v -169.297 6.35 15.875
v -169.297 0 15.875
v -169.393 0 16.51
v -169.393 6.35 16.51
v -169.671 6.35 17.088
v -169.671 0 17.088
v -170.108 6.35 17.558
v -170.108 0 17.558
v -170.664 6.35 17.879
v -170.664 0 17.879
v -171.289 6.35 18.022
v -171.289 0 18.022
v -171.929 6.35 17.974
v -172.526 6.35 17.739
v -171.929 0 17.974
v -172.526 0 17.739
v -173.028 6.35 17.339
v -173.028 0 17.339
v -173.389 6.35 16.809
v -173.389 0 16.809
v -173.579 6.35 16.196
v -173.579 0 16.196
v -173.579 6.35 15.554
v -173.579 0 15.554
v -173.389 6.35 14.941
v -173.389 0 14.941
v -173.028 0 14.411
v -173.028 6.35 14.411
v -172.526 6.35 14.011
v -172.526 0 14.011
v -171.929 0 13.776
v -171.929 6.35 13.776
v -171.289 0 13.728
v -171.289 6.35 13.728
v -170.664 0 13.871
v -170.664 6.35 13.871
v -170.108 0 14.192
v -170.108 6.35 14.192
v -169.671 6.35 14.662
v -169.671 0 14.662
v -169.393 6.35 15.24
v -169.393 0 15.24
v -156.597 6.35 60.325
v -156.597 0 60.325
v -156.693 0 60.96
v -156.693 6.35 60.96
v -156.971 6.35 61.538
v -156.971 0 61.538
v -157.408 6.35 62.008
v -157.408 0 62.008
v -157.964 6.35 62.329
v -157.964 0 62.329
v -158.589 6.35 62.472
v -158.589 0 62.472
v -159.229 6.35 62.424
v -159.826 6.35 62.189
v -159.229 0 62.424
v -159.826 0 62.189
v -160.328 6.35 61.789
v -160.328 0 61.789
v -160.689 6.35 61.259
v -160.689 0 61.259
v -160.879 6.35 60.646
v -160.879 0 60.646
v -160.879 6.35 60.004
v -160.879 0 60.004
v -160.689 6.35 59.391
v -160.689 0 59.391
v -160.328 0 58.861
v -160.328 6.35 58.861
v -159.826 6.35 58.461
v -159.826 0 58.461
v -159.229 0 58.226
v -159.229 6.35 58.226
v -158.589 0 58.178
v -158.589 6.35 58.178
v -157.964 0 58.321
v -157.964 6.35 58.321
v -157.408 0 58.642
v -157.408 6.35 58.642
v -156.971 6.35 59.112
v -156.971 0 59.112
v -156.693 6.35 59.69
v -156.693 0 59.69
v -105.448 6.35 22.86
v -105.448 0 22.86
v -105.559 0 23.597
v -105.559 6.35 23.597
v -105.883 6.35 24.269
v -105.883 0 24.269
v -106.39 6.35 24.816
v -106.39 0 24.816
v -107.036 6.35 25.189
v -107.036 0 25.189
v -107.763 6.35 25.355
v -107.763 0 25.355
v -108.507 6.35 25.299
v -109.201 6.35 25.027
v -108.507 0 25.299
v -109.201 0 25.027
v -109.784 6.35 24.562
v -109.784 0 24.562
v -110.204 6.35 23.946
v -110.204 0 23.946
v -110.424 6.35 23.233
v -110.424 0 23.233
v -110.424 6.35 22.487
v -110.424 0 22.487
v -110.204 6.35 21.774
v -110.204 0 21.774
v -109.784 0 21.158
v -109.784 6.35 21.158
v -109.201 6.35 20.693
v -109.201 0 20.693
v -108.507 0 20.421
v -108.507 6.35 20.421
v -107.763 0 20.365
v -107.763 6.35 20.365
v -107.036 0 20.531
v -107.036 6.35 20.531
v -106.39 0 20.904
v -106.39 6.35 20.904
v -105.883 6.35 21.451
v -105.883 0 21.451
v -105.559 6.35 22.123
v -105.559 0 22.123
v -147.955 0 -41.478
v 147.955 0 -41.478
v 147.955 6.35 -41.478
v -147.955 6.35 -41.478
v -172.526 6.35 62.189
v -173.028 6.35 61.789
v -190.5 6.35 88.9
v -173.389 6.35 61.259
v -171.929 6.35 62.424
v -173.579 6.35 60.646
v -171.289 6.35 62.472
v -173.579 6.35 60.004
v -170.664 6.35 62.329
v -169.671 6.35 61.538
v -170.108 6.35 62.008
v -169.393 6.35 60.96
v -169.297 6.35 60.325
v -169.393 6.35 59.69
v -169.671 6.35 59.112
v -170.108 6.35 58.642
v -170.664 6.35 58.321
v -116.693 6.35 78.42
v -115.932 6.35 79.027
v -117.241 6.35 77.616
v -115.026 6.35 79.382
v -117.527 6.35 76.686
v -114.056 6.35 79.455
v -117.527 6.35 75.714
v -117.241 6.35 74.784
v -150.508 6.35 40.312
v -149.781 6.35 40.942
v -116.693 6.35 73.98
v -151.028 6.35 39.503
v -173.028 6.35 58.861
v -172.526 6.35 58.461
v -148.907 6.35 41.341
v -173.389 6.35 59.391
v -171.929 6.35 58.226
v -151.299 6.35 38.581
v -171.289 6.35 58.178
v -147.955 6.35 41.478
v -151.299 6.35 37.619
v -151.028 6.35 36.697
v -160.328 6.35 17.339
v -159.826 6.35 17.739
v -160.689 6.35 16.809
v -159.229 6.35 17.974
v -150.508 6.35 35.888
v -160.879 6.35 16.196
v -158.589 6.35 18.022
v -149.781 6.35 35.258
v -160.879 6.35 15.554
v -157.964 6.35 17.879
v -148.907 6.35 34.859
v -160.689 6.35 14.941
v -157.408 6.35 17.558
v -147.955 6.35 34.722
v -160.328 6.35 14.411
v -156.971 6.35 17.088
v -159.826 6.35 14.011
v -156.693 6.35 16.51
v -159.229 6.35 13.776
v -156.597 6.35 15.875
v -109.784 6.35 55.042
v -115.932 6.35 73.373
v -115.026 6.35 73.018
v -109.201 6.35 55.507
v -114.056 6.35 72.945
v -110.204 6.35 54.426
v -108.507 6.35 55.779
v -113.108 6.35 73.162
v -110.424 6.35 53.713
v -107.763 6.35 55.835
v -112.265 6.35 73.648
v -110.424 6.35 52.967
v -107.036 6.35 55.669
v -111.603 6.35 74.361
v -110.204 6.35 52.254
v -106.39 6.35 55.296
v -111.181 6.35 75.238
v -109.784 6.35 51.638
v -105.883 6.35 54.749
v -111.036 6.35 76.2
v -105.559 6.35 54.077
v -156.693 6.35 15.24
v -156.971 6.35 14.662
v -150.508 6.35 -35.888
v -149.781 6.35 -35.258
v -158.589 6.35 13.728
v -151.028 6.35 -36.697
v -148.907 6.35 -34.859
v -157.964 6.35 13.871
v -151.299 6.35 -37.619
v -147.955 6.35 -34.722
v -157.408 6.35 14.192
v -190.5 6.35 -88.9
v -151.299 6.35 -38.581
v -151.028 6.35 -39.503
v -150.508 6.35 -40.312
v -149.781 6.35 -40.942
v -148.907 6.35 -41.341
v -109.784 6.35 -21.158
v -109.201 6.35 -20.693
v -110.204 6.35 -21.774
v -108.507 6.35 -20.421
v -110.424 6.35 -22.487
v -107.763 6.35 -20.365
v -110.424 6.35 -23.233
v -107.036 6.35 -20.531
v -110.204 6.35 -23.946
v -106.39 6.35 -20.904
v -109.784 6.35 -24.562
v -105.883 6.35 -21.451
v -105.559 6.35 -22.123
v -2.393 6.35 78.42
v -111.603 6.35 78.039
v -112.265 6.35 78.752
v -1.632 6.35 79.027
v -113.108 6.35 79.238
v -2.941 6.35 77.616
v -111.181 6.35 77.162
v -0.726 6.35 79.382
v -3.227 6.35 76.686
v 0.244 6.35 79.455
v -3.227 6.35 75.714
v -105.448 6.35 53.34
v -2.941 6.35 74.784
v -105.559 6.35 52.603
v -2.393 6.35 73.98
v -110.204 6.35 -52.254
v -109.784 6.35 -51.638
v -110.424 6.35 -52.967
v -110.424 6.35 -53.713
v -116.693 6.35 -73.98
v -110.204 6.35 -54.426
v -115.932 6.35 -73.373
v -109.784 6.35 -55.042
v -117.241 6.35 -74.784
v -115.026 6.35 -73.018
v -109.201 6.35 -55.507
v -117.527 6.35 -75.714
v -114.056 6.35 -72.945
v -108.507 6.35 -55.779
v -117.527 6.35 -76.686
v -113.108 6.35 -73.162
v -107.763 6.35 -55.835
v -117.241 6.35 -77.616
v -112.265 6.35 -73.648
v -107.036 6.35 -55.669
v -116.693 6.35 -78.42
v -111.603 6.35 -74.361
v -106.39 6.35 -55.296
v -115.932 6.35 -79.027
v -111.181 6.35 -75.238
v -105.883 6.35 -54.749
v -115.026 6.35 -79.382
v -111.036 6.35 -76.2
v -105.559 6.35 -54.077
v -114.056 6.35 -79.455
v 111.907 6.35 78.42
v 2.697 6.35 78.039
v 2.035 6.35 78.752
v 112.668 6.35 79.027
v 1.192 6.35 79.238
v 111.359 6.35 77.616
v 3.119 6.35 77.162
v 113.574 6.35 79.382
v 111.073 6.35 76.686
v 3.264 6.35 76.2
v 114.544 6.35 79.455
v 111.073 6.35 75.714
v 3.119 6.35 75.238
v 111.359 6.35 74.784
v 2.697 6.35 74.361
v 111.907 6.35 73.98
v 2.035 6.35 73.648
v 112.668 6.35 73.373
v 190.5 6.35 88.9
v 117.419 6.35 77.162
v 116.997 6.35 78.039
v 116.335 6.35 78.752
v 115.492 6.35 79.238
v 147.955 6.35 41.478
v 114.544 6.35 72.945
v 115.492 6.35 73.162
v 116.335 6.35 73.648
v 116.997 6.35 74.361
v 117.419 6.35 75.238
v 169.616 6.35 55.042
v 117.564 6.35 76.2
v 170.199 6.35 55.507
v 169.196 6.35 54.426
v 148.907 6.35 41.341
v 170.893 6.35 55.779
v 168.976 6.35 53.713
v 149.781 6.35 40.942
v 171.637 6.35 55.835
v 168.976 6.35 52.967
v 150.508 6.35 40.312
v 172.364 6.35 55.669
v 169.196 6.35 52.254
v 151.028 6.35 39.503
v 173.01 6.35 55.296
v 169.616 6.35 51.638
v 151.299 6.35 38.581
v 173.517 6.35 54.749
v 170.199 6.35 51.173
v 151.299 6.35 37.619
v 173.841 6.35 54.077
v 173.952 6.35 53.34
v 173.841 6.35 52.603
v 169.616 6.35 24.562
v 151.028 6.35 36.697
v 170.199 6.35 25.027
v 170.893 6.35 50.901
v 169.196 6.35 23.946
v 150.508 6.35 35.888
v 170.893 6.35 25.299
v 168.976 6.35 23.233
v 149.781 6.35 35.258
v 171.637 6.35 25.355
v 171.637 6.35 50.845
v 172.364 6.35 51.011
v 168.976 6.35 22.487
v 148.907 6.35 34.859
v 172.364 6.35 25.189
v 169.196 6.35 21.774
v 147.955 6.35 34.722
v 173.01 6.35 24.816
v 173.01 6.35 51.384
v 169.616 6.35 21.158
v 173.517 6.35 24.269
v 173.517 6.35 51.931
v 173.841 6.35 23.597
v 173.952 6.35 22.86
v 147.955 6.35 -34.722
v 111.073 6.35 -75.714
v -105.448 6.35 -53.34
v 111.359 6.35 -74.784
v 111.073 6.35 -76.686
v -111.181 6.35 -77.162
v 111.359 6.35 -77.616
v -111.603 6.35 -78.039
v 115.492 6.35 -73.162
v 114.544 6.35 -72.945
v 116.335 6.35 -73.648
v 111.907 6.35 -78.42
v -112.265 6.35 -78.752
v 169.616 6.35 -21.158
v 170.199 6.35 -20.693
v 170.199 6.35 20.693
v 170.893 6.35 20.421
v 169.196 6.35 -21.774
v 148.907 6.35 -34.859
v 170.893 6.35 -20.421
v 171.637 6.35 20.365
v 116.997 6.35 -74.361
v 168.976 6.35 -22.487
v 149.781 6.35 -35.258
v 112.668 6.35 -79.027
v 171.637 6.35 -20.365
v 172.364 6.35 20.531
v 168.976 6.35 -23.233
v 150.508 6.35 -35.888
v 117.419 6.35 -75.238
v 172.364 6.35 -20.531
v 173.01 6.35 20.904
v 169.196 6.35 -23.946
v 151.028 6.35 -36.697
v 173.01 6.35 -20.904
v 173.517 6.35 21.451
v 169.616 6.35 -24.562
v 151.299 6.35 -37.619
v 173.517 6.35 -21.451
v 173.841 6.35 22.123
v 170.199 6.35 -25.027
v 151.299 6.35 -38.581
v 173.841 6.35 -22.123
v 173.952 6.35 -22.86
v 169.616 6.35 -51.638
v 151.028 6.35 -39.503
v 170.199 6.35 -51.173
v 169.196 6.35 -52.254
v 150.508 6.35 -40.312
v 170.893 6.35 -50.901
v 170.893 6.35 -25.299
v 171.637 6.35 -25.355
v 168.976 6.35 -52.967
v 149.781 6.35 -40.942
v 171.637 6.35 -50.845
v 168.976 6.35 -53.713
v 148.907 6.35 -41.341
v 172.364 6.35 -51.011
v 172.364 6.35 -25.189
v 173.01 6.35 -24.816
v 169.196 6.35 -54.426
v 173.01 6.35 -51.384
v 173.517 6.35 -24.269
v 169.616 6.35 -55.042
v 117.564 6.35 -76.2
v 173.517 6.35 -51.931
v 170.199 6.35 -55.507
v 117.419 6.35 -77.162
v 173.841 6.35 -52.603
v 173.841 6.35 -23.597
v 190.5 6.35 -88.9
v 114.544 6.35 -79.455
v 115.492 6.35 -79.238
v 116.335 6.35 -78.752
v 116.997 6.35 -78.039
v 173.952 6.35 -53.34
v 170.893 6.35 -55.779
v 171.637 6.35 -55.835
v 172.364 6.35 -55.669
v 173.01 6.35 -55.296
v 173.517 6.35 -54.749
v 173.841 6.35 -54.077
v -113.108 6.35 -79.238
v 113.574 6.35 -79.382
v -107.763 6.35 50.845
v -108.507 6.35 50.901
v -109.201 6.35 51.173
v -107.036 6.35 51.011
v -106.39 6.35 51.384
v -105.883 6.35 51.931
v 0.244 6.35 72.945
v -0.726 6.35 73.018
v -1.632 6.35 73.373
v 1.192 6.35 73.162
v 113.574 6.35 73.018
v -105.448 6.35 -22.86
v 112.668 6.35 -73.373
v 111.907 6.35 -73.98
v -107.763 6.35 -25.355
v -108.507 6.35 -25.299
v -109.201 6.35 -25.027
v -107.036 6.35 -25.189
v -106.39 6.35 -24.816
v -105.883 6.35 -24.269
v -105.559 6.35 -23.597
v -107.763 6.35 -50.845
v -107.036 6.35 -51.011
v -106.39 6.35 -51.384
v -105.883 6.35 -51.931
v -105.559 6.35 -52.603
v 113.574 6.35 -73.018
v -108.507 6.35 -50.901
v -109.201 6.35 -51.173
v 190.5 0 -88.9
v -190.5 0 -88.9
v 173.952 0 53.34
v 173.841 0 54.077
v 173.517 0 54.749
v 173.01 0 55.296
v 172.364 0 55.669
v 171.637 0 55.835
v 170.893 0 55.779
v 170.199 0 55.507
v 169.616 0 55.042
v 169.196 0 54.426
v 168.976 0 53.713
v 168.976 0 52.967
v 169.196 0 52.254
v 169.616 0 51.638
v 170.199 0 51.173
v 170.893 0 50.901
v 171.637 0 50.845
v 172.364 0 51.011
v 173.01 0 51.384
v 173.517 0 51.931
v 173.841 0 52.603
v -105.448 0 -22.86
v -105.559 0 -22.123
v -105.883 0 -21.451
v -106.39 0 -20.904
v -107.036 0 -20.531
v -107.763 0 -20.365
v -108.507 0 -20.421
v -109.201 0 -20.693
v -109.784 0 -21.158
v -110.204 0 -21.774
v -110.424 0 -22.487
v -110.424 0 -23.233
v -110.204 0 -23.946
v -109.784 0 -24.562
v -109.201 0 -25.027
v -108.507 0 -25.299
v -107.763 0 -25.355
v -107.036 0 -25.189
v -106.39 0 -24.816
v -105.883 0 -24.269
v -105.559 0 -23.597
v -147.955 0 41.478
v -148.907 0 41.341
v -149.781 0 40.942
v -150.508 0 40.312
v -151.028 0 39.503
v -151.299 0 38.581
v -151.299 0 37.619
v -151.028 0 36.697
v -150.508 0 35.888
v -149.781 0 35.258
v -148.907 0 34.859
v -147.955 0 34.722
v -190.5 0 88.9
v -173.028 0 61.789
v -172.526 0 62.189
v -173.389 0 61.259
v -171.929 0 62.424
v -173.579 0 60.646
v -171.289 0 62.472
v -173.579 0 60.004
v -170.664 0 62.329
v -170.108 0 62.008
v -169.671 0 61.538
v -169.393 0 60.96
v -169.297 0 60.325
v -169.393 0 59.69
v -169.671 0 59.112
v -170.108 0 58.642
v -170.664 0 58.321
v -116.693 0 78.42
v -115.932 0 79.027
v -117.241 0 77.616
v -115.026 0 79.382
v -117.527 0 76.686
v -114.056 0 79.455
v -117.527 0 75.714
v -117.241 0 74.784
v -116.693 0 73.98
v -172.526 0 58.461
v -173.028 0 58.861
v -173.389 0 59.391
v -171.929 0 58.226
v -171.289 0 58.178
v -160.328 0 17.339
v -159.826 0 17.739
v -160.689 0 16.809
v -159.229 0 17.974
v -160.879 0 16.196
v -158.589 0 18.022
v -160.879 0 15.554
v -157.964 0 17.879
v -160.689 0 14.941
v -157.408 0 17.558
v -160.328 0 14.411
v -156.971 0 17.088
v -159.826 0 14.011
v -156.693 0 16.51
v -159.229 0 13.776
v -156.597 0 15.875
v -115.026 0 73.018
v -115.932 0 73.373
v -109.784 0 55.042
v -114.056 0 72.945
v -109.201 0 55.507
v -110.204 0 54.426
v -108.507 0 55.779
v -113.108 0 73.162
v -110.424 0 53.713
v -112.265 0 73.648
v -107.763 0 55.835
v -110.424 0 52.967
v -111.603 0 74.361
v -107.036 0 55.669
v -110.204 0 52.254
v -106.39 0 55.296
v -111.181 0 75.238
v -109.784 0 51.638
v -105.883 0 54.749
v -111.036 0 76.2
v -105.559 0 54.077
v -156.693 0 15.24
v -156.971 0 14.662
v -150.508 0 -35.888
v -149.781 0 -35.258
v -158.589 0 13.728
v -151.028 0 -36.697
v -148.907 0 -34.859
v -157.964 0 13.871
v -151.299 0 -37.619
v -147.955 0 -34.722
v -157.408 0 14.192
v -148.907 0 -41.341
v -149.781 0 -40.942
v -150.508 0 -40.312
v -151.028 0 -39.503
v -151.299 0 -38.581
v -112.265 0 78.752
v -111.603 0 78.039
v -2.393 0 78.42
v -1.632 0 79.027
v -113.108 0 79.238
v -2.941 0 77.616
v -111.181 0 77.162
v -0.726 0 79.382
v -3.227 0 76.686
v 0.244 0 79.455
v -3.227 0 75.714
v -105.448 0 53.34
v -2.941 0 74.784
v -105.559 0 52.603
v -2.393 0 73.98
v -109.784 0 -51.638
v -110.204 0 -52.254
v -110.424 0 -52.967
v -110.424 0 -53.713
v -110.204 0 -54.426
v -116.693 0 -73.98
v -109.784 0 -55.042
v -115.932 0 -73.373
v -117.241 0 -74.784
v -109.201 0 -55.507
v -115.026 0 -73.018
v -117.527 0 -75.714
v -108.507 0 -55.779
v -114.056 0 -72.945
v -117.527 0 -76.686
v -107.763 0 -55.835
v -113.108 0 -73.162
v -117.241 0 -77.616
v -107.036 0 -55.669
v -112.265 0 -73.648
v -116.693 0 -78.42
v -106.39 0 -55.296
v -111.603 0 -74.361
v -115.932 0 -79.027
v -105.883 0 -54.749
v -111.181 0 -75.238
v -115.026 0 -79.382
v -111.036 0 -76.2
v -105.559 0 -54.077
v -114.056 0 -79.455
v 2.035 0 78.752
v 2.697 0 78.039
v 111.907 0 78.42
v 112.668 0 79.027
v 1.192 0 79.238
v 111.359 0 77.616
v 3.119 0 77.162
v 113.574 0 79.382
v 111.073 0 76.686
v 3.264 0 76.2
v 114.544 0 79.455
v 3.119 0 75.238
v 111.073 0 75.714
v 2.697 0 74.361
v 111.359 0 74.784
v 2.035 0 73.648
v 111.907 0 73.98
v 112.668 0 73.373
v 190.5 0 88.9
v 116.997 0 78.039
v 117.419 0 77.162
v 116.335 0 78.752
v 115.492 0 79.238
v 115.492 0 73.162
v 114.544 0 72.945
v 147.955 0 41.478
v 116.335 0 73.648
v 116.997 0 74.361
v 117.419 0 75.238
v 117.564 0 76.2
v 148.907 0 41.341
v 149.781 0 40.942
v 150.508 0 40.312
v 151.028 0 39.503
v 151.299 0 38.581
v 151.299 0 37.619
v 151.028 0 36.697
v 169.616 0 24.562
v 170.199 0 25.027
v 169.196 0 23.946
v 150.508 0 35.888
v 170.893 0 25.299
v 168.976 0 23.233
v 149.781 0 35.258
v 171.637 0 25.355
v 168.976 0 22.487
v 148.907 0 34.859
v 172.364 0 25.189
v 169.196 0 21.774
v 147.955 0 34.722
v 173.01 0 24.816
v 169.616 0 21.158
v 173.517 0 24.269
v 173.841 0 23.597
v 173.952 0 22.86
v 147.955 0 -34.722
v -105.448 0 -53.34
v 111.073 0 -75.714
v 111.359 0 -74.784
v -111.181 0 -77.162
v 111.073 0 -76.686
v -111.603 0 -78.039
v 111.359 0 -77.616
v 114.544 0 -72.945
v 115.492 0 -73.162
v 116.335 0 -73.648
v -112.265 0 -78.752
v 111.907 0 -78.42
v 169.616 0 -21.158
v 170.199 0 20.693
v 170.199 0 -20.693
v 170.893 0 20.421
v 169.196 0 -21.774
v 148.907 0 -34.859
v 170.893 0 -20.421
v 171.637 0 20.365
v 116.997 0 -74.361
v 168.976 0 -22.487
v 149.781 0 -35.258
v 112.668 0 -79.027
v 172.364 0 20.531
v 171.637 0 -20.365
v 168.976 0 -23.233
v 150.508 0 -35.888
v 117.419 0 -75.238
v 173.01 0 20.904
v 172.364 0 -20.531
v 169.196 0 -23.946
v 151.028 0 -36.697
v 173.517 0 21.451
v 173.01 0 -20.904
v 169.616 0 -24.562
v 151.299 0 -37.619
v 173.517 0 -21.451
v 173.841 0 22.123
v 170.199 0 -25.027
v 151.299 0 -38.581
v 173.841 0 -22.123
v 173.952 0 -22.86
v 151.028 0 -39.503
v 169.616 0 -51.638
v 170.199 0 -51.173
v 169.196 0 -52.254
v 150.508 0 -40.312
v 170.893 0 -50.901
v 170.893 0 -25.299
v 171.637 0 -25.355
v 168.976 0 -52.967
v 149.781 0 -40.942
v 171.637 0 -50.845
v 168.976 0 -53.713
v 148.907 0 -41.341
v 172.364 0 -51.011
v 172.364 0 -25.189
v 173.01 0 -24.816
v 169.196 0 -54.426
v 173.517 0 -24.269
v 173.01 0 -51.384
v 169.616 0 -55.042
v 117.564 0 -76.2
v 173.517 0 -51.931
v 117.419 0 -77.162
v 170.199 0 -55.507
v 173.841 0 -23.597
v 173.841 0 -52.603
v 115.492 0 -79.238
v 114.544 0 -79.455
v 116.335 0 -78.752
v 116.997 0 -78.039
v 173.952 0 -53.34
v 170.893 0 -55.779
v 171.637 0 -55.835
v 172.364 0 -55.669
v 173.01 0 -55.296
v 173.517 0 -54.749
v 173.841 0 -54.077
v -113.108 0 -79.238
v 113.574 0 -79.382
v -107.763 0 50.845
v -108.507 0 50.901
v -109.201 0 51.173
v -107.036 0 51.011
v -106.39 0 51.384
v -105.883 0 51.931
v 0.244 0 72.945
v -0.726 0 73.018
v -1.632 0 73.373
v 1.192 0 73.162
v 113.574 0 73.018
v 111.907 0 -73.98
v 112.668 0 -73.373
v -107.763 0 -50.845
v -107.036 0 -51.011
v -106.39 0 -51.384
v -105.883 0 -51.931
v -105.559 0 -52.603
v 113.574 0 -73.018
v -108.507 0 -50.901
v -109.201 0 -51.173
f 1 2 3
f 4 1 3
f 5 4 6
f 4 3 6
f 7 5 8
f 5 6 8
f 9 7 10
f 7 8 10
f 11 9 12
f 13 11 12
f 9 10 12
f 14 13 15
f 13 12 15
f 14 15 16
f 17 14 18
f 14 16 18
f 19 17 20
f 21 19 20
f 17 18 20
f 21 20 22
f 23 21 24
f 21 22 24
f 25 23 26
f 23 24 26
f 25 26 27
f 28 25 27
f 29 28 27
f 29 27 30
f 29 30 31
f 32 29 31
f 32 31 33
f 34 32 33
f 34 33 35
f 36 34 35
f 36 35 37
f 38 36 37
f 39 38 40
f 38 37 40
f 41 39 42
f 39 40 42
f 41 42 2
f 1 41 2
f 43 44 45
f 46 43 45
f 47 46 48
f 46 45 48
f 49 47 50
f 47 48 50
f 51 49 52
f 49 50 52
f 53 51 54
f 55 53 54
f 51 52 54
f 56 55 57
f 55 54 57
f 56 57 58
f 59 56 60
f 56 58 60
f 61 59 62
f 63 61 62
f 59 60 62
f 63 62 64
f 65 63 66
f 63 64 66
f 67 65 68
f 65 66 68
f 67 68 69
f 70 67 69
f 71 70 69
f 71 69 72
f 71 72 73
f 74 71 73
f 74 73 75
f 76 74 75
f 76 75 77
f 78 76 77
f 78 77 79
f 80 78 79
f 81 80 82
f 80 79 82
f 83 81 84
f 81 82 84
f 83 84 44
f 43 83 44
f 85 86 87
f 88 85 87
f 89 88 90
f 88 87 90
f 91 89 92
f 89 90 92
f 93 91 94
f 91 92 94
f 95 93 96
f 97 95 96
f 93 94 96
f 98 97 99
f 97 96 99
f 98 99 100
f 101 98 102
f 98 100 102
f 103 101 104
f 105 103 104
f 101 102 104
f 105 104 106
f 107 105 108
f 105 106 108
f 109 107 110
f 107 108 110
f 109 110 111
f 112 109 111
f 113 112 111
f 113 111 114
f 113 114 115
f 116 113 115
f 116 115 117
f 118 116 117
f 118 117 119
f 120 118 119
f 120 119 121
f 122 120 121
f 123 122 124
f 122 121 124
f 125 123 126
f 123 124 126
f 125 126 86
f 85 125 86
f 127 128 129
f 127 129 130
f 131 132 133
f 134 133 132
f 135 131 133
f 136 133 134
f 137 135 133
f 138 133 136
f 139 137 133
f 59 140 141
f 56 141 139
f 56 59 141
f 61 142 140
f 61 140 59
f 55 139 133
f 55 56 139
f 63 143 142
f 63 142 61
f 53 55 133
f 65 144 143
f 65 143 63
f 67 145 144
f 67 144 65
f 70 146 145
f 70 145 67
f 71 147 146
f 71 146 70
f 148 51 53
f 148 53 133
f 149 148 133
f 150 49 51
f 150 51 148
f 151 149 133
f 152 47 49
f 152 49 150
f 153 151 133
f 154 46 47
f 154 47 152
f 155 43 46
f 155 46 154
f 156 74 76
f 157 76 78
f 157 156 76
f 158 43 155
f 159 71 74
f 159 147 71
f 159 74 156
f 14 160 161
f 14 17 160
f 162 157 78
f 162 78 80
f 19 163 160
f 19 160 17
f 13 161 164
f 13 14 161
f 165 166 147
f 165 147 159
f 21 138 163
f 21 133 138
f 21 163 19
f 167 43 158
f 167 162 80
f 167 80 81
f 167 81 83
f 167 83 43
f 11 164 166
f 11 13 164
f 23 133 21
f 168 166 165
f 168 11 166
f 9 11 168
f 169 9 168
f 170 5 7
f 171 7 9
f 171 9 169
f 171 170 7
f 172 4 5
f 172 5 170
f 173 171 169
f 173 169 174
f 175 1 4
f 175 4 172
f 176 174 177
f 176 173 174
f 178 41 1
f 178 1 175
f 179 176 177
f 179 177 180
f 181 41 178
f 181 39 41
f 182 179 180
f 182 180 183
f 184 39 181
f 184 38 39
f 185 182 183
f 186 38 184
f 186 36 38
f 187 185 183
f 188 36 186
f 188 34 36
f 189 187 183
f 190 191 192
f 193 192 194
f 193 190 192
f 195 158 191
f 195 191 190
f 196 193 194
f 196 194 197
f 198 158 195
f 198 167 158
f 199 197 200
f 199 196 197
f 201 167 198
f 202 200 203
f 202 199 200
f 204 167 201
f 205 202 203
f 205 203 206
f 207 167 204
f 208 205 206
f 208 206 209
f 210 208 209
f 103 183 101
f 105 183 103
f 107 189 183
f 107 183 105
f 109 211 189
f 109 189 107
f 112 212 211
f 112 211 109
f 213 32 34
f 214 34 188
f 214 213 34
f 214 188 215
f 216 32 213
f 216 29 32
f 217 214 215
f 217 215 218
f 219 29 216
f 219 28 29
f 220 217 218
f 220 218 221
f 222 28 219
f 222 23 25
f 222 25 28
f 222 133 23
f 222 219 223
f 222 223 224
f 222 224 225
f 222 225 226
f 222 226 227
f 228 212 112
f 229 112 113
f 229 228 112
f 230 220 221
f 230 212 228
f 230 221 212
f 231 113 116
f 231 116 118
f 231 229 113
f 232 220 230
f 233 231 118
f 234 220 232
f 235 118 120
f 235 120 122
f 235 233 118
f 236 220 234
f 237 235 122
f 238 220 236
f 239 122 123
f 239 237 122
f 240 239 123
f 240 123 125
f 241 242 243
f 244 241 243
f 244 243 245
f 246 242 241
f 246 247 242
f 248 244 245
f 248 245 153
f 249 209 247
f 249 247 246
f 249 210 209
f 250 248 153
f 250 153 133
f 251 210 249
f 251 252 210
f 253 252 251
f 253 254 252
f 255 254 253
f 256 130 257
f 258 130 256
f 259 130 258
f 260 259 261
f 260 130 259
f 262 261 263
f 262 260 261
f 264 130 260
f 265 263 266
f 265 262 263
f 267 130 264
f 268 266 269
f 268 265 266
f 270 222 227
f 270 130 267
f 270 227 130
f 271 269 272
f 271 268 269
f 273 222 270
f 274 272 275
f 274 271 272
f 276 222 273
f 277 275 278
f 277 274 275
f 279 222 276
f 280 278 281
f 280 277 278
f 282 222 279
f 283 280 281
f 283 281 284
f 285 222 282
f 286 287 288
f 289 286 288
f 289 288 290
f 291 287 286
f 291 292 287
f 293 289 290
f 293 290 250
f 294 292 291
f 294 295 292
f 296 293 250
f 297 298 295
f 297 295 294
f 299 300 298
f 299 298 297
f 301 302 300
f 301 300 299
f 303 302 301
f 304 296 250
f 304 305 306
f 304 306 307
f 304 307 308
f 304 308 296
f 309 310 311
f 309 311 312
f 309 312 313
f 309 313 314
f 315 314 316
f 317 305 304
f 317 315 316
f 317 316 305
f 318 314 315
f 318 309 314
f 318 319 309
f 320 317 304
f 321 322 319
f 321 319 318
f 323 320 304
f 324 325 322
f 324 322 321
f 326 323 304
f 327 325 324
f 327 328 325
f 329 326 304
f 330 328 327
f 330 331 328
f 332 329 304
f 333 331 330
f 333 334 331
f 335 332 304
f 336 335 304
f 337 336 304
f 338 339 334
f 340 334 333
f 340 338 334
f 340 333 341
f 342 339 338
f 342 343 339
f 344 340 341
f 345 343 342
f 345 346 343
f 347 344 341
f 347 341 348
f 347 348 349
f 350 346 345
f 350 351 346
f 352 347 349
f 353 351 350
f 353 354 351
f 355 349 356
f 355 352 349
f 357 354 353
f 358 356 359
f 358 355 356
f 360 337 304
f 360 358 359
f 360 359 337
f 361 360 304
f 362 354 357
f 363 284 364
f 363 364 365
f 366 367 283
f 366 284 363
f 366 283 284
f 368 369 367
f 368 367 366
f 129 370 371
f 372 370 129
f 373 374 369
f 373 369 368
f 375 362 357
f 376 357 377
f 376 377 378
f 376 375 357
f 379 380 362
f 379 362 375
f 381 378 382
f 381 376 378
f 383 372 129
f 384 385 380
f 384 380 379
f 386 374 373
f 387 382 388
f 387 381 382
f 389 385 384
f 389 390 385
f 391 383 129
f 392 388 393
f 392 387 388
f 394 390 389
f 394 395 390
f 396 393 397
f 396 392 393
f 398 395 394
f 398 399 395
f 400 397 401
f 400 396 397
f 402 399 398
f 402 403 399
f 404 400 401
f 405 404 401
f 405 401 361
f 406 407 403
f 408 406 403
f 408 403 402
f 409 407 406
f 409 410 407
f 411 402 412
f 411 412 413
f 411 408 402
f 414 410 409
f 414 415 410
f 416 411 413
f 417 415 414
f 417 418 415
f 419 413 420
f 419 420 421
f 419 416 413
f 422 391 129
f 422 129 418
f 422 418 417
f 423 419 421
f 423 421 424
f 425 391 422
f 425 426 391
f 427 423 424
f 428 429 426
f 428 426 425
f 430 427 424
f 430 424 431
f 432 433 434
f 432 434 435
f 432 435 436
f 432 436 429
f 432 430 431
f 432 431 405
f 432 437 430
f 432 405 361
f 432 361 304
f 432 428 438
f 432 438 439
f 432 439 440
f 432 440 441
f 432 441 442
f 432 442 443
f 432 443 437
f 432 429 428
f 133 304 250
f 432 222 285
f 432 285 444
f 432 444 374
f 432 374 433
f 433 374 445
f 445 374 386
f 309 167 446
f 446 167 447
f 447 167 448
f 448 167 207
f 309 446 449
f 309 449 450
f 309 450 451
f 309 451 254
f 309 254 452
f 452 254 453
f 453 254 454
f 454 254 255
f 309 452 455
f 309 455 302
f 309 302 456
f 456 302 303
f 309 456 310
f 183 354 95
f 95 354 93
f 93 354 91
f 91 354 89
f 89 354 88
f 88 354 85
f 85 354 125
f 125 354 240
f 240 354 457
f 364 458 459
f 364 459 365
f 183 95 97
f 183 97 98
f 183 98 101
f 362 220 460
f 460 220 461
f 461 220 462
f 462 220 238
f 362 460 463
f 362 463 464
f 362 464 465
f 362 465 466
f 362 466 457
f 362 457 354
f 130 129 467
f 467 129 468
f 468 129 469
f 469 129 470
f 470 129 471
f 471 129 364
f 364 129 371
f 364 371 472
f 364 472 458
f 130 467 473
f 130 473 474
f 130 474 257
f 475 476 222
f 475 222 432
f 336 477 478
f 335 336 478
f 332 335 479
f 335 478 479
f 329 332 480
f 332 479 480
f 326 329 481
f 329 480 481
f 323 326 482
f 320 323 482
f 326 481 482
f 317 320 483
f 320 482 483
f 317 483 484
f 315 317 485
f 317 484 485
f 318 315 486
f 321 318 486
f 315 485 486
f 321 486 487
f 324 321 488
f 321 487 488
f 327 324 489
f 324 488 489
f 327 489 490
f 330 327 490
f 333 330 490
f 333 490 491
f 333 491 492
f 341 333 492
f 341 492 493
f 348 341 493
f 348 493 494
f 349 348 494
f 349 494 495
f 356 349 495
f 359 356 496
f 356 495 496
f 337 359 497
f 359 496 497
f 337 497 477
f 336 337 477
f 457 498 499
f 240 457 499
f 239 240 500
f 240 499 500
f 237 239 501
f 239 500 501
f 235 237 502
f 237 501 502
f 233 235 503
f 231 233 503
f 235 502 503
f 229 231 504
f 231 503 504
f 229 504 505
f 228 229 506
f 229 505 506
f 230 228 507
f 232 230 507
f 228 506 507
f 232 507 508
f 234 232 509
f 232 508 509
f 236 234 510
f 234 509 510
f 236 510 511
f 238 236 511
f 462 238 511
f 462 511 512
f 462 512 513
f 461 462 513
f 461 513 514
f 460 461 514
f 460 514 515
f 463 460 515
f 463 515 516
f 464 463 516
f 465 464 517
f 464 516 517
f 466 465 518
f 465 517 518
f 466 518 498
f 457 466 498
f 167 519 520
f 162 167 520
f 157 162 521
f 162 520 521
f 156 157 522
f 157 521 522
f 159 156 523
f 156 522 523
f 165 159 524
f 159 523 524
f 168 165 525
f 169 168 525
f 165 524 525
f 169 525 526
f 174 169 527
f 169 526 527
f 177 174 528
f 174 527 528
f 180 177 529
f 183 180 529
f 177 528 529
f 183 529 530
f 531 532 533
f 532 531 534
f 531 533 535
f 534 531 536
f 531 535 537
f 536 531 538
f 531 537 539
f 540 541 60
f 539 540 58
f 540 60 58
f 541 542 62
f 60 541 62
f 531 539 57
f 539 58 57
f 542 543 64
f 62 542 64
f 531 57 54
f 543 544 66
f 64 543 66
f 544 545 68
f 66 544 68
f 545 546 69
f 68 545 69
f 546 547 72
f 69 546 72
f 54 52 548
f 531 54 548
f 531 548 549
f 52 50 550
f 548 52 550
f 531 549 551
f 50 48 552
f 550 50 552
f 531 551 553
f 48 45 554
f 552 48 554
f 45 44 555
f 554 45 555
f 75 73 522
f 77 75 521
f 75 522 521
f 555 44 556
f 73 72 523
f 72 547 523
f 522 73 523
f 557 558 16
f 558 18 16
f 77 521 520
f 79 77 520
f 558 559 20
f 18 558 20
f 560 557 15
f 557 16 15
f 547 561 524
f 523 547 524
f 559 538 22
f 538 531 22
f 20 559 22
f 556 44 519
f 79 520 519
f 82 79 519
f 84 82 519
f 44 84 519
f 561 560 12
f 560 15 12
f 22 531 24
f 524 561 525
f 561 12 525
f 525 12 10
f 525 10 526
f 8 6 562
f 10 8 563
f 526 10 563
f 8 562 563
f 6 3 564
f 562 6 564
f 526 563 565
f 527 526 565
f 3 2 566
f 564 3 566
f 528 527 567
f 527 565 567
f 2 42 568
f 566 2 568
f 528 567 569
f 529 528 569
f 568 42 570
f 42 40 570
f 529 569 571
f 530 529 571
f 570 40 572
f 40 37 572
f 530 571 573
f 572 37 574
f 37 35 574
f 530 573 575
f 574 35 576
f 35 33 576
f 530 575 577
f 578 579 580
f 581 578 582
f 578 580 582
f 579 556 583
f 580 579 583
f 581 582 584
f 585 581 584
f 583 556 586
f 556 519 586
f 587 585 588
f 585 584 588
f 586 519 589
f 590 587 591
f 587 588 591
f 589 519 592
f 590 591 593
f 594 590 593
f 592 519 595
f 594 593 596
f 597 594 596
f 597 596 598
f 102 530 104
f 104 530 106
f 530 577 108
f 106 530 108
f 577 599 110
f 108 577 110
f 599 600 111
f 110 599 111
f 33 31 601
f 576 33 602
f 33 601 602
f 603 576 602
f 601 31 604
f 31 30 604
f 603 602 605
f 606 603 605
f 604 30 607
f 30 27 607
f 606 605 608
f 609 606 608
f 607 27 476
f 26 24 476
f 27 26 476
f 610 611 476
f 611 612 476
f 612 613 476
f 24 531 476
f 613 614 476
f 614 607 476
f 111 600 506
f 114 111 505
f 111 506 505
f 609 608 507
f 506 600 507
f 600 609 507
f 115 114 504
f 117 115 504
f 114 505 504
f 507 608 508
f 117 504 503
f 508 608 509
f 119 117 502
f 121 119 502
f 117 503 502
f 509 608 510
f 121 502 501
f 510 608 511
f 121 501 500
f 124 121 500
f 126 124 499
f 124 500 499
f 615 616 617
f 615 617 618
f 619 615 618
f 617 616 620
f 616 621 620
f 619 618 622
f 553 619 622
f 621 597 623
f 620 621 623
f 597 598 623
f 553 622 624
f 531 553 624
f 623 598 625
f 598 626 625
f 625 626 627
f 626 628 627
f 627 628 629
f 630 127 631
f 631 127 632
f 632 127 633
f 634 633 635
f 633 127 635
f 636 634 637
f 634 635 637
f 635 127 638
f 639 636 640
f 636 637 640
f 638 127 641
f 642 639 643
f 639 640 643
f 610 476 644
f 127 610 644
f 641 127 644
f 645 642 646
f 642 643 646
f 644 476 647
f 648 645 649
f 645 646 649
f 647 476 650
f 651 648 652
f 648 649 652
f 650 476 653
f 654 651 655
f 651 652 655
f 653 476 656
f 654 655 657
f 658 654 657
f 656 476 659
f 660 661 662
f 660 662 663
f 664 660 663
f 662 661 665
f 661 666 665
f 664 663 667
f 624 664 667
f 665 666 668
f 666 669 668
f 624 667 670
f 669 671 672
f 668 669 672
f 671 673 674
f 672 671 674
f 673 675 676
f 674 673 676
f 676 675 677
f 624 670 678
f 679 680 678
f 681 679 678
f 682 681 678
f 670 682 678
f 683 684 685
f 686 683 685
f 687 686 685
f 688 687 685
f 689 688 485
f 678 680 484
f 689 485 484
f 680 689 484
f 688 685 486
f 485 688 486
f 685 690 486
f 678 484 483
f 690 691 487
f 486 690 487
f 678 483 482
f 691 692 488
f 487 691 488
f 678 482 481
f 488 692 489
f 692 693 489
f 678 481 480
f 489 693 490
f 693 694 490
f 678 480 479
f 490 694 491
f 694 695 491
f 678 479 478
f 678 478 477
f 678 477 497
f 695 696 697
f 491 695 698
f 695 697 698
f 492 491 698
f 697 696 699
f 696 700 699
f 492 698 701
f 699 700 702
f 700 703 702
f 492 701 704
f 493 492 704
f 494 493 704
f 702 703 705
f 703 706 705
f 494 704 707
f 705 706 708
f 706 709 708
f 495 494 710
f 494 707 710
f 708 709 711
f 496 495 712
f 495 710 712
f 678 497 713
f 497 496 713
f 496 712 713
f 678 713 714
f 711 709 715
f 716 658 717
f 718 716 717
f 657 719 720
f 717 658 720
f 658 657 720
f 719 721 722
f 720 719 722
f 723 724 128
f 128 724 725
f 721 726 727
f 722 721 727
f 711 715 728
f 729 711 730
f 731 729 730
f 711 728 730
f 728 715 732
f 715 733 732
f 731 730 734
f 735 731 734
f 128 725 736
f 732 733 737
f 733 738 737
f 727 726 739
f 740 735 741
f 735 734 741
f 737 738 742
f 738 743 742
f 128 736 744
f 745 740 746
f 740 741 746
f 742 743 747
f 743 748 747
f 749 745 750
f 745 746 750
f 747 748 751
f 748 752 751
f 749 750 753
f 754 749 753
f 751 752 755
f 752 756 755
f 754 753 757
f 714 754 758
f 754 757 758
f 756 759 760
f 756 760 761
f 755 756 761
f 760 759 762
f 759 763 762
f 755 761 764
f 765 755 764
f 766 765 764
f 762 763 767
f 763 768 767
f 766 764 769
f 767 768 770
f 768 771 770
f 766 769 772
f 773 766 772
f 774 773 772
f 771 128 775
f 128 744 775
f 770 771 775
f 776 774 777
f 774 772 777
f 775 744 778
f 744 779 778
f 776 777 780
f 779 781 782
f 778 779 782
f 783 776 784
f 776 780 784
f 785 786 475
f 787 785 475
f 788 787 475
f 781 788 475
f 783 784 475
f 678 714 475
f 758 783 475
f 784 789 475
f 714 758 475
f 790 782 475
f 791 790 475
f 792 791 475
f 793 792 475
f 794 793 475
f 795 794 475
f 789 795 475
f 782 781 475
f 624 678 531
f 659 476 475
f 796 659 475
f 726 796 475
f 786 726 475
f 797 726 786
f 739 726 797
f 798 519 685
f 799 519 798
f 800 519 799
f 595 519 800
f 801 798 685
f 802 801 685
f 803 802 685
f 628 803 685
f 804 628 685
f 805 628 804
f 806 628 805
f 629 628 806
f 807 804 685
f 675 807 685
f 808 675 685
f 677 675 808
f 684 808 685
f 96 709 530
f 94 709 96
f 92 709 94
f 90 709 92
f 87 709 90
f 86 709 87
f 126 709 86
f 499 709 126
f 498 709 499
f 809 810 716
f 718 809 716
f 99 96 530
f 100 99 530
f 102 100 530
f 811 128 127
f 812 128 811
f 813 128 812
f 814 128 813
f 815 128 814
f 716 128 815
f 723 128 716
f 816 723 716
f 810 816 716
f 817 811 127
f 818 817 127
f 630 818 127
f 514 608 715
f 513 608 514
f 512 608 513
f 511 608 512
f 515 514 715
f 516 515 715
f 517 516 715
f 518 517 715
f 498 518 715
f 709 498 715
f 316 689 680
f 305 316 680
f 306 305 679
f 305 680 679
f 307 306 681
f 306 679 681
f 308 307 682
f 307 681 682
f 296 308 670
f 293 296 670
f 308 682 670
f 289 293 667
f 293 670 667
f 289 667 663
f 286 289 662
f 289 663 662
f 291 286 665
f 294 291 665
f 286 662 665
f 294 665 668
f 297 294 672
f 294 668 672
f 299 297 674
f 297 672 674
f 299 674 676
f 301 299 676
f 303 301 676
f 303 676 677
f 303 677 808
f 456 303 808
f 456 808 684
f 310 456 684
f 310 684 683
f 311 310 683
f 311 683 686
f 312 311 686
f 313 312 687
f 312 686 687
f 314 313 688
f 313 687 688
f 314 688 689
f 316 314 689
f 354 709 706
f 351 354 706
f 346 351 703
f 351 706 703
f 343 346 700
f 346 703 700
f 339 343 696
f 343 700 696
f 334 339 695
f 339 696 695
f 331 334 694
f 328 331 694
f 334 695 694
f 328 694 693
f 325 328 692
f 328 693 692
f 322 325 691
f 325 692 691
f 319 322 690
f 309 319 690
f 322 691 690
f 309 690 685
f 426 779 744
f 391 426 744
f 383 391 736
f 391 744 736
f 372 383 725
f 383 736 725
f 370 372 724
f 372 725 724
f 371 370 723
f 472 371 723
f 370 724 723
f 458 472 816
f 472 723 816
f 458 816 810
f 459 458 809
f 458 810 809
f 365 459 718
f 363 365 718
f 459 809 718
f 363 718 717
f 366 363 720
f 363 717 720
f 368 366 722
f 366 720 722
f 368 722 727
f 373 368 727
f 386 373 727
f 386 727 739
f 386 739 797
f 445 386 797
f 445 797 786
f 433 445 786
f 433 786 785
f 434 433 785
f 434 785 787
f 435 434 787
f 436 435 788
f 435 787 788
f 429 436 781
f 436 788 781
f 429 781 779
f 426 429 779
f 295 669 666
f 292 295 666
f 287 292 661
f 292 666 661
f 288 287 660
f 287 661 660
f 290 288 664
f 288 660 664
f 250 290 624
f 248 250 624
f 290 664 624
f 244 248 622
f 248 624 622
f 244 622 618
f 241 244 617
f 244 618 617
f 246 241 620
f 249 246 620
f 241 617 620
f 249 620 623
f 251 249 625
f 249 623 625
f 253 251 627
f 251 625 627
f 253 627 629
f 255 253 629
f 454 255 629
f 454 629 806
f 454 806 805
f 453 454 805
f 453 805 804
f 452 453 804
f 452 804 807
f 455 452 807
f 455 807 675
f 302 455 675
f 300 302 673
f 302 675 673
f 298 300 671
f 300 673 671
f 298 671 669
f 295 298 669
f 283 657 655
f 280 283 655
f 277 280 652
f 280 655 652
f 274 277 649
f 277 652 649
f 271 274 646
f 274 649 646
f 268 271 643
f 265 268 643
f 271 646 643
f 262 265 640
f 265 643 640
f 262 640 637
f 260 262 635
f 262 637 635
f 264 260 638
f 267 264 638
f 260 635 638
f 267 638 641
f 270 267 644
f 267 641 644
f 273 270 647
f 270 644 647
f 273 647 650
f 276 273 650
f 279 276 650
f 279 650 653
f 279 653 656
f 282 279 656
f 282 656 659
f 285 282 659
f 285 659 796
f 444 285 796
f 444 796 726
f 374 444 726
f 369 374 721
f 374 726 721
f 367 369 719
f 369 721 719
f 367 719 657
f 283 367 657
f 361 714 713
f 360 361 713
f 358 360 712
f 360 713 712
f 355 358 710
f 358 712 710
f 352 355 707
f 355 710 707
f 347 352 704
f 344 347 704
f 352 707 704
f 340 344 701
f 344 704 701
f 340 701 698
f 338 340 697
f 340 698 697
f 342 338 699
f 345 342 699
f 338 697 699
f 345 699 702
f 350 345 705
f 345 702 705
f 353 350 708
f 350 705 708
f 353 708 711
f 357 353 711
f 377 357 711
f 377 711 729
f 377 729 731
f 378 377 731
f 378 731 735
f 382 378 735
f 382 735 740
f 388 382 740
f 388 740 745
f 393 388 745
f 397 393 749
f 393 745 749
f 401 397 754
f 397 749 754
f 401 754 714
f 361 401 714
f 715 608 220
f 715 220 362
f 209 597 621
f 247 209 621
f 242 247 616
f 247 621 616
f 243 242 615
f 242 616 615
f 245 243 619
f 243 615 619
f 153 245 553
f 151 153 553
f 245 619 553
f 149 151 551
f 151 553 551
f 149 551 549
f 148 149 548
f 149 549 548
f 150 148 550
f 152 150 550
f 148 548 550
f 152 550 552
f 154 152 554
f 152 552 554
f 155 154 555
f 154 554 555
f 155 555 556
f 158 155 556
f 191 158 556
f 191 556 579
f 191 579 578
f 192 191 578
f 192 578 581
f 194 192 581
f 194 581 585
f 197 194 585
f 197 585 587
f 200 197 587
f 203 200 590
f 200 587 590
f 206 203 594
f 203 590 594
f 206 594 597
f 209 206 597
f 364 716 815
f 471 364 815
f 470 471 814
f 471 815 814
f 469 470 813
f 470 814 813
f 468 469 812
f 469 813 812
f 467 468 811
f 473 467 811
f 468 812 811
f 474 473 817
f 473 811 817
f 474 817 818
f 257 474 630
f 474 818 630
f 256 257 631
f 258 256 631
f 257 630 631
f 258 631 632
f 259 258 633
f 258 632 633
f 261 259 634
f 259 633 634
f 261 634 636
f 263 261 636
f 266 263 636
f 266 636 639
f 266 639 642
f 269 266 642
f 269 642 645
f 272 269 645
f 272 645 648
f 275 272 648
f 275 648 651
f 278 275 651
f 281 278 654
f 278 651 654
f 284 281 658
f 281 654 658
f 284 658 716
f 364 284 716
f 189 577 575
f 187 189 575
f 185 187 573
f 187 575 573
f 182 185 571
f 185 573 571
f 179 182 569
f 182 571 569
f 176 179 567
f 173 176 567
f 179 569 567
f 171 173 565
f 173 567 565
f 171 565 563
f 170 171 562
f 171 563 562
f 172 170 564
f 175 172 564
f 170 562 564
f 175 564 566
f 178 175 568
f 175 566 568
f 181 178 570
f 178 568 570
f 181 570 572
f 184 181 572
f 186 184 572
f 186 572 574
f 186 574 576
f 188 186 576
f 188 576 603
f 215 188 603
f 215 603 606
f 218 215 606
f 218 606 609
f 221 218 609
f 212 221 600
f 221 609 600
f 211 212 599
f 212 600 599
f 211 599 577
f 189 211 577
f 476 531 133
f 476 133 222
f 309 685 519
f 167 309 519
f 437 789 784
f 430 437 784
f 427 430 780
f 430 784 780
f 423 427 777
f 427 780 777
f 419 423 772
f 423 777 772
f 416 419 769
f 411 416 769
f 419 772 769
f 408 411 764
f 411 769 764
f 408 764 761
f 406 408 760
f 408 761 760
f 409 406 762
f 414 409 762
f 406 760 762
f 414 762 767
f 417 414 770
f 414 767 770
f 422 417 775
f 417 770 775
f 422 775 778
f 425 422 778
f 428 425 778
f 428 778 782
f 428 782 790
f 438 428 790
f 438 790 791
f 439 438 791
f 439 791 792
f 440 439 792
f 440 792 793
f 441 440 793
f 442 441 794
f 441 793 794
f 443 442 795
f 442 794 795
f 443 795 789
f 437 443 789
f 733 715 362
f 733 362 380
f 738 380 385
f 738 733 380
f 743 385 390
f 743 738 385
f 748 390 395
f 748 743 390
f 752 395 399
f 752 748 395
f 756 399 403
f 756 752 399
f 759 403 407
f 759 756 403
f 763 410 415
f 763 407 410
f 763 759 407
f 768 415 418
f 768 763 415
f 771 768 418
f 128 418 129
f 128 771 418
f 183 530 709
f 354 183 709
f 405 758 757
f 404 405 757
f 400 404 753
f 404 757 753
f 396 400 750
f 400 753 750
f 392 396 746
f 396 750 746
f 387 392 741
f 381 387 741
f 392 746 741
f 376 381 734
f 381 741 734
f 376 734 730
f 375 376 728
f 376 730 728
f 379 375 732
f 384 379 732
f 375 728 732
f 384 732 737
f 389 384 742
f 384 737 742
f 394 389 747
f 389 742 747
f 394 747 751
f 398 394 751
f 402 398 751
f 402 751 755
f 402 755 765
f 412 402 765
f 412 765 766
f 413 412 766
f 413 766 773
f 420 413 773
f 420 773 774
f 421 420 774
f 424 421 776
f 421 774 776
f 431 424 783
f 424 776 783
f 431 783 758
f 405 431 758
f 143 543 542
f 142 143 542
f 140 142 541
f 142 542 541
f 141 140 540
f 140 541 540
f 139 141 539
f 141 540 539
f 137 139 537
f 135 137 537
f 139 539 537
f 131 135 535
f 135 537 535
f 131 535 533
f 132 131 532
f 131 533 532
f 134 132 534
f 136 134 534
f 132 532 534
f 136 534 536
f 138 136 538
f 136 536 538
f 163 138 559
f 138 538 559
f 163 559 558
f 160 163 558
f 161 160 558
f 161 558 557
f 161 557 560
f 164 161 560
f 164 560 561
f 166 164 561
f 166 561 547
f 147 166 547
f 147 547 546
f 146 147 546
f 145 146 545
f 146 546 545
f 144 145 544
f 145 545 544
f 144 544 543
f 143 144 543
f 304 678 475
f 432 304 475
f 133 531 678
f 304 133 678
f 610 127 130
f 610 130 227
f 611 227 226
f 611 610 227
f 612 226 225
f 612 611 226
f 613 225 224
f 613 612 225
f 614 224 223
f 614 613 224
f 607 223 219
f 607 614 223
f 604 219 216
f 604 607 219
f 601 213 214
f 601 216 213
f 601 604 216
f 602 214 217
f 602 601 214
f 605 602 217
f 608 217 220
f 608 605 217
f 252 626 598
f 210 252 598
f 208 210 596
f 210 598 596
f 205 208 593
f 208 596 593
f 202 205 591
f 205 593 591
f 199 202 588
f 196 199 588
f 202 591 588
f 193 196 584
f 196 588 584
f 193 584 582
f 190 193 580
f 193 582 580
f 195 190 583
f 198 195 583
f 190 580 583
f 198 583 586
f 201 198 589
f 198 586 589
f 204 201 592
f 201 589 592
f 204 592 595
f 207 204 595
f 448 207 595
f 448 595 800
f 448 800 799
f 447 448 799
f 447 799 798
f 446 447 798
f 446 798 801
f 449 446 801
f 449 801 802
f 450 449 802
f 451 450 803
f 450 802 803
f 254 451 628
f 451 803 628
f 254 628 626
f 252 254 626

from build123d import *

# Parameters (mm, degrees)
SKETCH1_W                  = 381
SKETCH1_H                  = 177.8
PLATE_DEPTH                = 6.35
SKETCH4_R                  = 3.2639
CHASSISMOUNTINGHOLES_DEPTH = 6.35
SKETCH5_R                  = 2.5019
LEADSCREWGUIDEMOUNTS_DEPTH = 6.35
SKETCH6_R                  = 2.15265
LEADSCREWMOTORMOUNT_DEPTH  = 6.35
SKETCH8_R                  = 3.2639
CUT_EXTRUDE2_DEPTH         = 7.35
CUT_EXTRUDE4_DEPTH         = 7.35


with BuildPart() as part:
    # Sketch1 → Plate (new body)
    with BuildSketch(Plane(origin=(0, 0, 0), x_dir=(1, 0, 0), z_dir=(0, 1, 0))):
        Rectangle(SKETCH1_W, SKETCH1_H)
    extrude(amount=PLATE_DEPTH)

    # Sketch4 → ChassisMountingHoles (cut)
    with BuildSketch(Plane.XZ):
        with Locations((0, 76.2)):
            Circle(SKETCH4_R)
        with Locations((-114.3, 76.2)):
            Circle(SKETCH4_R)
        with Locations((114.3, 76.2)):
            Circle(SKETCH4_R)
        with Locations((-114.3, -76.2)):
            Circle(SKETCH4_R)
        with Locations((114.3, -76.2)):
            Circle(SKETCH4_R)
    extrude(amount=-CHASSISMOUNTINGHOLES_DEPTH, mode=Mode.SUBTRACT)

    # Sketch5 → LeadScrewGuideMounts (cut)
    with BuildSketch(Plane.XZ):
        with Locations((171.45, 53.34)):
            Circle(SKETCH5_R)
        with Locations((171.45, 22.86)):
            Circle(SKETCH5_R)
        with Locations((-107.95, 53.34)):
            Circle(SKETCH5_R)
        with Locations((-107.95, 22.86)):
            Circle(SKETCH5_R)
        with Locations((171.45, -53.34)):
            Circle(SKETCH5_R)
        with Locations((171.45, -22.86)):
            Circle(SKETCH5_R)
        with Locations((-107.95, -22.86)):
            Circle(SKETCH5_R)
        with Locations((-107.95, -53.34)):
            Circle(SKETCH5_R)
    extrude(amount=-LEADSCREWGUIDEMOUNTS_DEPTH, mode=Mode.SUBTRACT)

    # Sketch6 → LeadScrewMotorMount (cut)
    with BuildSketch(Plane.XZ):
        with Locations((-171.45, 60.325)):
            Circle(SKETCH6_R)
        with Locations((-158.75, 60.325)):
            Circle(SKETCH6_R)
        with Locations((-171.45, 15.875)):
            Circle(SKETCH6_R)
        with Locations((-158.75, 15.875)):
            Circle(SKETCH6_R)
    extrude(amount=-LEADSCREWMOTORMOUNT_DEPTH, mode=Mode.SUBTRACT)

    # Sketch8 → Cut-Extrude2 (cut, through all)
    with BuildSketch(Plane.XZ):
        with Locations((-25.4, 38.1)):
            Circle(SKETCH8_R)
        with Locations((25.4, 38.1)):
            Circle(SKETCH8_R)
        with Locations((76.2, 38.1)):
            Circle(SKETCH8_R)
    extrude(amount=-CUT_EXTRUDE2_DEPTH, mode=Mode.SUBTRACT)

    # Sketch10 → Cut-Extrude4 (cut, through all)
    with BuildSketch(Plane.XZ):
        with BuildLine():
            Line((-25.4, 41.4782), (-147.955, 41.4782))
            ThreePointArc((-147.955, 41.4782), (-151.3332, 38.1), (-147.955, 34.7218))
            Line((-147.955, 34.7218), (147.955, 34.7218))
            ThreePointArc((147.955, 34.7218), (151.3332, 38.1), (147.955, 41.4782))
            Line((147.955, 41.4782), (0, 41.4782))
            Line((0, 41.4782), (-25.4, 41.4782))
        make_face()
    cut_extrude4 = extrude(amount=-CUT_EXTRUDE4_DEPTH, mode=Mode.SUBTRACT)

    # Mirror3: Cut-Extrude4 across plane
    add(cut_extrude4.mirror(Plane.XY), mode=Mode.SUBTRACT)


solid = part.part
